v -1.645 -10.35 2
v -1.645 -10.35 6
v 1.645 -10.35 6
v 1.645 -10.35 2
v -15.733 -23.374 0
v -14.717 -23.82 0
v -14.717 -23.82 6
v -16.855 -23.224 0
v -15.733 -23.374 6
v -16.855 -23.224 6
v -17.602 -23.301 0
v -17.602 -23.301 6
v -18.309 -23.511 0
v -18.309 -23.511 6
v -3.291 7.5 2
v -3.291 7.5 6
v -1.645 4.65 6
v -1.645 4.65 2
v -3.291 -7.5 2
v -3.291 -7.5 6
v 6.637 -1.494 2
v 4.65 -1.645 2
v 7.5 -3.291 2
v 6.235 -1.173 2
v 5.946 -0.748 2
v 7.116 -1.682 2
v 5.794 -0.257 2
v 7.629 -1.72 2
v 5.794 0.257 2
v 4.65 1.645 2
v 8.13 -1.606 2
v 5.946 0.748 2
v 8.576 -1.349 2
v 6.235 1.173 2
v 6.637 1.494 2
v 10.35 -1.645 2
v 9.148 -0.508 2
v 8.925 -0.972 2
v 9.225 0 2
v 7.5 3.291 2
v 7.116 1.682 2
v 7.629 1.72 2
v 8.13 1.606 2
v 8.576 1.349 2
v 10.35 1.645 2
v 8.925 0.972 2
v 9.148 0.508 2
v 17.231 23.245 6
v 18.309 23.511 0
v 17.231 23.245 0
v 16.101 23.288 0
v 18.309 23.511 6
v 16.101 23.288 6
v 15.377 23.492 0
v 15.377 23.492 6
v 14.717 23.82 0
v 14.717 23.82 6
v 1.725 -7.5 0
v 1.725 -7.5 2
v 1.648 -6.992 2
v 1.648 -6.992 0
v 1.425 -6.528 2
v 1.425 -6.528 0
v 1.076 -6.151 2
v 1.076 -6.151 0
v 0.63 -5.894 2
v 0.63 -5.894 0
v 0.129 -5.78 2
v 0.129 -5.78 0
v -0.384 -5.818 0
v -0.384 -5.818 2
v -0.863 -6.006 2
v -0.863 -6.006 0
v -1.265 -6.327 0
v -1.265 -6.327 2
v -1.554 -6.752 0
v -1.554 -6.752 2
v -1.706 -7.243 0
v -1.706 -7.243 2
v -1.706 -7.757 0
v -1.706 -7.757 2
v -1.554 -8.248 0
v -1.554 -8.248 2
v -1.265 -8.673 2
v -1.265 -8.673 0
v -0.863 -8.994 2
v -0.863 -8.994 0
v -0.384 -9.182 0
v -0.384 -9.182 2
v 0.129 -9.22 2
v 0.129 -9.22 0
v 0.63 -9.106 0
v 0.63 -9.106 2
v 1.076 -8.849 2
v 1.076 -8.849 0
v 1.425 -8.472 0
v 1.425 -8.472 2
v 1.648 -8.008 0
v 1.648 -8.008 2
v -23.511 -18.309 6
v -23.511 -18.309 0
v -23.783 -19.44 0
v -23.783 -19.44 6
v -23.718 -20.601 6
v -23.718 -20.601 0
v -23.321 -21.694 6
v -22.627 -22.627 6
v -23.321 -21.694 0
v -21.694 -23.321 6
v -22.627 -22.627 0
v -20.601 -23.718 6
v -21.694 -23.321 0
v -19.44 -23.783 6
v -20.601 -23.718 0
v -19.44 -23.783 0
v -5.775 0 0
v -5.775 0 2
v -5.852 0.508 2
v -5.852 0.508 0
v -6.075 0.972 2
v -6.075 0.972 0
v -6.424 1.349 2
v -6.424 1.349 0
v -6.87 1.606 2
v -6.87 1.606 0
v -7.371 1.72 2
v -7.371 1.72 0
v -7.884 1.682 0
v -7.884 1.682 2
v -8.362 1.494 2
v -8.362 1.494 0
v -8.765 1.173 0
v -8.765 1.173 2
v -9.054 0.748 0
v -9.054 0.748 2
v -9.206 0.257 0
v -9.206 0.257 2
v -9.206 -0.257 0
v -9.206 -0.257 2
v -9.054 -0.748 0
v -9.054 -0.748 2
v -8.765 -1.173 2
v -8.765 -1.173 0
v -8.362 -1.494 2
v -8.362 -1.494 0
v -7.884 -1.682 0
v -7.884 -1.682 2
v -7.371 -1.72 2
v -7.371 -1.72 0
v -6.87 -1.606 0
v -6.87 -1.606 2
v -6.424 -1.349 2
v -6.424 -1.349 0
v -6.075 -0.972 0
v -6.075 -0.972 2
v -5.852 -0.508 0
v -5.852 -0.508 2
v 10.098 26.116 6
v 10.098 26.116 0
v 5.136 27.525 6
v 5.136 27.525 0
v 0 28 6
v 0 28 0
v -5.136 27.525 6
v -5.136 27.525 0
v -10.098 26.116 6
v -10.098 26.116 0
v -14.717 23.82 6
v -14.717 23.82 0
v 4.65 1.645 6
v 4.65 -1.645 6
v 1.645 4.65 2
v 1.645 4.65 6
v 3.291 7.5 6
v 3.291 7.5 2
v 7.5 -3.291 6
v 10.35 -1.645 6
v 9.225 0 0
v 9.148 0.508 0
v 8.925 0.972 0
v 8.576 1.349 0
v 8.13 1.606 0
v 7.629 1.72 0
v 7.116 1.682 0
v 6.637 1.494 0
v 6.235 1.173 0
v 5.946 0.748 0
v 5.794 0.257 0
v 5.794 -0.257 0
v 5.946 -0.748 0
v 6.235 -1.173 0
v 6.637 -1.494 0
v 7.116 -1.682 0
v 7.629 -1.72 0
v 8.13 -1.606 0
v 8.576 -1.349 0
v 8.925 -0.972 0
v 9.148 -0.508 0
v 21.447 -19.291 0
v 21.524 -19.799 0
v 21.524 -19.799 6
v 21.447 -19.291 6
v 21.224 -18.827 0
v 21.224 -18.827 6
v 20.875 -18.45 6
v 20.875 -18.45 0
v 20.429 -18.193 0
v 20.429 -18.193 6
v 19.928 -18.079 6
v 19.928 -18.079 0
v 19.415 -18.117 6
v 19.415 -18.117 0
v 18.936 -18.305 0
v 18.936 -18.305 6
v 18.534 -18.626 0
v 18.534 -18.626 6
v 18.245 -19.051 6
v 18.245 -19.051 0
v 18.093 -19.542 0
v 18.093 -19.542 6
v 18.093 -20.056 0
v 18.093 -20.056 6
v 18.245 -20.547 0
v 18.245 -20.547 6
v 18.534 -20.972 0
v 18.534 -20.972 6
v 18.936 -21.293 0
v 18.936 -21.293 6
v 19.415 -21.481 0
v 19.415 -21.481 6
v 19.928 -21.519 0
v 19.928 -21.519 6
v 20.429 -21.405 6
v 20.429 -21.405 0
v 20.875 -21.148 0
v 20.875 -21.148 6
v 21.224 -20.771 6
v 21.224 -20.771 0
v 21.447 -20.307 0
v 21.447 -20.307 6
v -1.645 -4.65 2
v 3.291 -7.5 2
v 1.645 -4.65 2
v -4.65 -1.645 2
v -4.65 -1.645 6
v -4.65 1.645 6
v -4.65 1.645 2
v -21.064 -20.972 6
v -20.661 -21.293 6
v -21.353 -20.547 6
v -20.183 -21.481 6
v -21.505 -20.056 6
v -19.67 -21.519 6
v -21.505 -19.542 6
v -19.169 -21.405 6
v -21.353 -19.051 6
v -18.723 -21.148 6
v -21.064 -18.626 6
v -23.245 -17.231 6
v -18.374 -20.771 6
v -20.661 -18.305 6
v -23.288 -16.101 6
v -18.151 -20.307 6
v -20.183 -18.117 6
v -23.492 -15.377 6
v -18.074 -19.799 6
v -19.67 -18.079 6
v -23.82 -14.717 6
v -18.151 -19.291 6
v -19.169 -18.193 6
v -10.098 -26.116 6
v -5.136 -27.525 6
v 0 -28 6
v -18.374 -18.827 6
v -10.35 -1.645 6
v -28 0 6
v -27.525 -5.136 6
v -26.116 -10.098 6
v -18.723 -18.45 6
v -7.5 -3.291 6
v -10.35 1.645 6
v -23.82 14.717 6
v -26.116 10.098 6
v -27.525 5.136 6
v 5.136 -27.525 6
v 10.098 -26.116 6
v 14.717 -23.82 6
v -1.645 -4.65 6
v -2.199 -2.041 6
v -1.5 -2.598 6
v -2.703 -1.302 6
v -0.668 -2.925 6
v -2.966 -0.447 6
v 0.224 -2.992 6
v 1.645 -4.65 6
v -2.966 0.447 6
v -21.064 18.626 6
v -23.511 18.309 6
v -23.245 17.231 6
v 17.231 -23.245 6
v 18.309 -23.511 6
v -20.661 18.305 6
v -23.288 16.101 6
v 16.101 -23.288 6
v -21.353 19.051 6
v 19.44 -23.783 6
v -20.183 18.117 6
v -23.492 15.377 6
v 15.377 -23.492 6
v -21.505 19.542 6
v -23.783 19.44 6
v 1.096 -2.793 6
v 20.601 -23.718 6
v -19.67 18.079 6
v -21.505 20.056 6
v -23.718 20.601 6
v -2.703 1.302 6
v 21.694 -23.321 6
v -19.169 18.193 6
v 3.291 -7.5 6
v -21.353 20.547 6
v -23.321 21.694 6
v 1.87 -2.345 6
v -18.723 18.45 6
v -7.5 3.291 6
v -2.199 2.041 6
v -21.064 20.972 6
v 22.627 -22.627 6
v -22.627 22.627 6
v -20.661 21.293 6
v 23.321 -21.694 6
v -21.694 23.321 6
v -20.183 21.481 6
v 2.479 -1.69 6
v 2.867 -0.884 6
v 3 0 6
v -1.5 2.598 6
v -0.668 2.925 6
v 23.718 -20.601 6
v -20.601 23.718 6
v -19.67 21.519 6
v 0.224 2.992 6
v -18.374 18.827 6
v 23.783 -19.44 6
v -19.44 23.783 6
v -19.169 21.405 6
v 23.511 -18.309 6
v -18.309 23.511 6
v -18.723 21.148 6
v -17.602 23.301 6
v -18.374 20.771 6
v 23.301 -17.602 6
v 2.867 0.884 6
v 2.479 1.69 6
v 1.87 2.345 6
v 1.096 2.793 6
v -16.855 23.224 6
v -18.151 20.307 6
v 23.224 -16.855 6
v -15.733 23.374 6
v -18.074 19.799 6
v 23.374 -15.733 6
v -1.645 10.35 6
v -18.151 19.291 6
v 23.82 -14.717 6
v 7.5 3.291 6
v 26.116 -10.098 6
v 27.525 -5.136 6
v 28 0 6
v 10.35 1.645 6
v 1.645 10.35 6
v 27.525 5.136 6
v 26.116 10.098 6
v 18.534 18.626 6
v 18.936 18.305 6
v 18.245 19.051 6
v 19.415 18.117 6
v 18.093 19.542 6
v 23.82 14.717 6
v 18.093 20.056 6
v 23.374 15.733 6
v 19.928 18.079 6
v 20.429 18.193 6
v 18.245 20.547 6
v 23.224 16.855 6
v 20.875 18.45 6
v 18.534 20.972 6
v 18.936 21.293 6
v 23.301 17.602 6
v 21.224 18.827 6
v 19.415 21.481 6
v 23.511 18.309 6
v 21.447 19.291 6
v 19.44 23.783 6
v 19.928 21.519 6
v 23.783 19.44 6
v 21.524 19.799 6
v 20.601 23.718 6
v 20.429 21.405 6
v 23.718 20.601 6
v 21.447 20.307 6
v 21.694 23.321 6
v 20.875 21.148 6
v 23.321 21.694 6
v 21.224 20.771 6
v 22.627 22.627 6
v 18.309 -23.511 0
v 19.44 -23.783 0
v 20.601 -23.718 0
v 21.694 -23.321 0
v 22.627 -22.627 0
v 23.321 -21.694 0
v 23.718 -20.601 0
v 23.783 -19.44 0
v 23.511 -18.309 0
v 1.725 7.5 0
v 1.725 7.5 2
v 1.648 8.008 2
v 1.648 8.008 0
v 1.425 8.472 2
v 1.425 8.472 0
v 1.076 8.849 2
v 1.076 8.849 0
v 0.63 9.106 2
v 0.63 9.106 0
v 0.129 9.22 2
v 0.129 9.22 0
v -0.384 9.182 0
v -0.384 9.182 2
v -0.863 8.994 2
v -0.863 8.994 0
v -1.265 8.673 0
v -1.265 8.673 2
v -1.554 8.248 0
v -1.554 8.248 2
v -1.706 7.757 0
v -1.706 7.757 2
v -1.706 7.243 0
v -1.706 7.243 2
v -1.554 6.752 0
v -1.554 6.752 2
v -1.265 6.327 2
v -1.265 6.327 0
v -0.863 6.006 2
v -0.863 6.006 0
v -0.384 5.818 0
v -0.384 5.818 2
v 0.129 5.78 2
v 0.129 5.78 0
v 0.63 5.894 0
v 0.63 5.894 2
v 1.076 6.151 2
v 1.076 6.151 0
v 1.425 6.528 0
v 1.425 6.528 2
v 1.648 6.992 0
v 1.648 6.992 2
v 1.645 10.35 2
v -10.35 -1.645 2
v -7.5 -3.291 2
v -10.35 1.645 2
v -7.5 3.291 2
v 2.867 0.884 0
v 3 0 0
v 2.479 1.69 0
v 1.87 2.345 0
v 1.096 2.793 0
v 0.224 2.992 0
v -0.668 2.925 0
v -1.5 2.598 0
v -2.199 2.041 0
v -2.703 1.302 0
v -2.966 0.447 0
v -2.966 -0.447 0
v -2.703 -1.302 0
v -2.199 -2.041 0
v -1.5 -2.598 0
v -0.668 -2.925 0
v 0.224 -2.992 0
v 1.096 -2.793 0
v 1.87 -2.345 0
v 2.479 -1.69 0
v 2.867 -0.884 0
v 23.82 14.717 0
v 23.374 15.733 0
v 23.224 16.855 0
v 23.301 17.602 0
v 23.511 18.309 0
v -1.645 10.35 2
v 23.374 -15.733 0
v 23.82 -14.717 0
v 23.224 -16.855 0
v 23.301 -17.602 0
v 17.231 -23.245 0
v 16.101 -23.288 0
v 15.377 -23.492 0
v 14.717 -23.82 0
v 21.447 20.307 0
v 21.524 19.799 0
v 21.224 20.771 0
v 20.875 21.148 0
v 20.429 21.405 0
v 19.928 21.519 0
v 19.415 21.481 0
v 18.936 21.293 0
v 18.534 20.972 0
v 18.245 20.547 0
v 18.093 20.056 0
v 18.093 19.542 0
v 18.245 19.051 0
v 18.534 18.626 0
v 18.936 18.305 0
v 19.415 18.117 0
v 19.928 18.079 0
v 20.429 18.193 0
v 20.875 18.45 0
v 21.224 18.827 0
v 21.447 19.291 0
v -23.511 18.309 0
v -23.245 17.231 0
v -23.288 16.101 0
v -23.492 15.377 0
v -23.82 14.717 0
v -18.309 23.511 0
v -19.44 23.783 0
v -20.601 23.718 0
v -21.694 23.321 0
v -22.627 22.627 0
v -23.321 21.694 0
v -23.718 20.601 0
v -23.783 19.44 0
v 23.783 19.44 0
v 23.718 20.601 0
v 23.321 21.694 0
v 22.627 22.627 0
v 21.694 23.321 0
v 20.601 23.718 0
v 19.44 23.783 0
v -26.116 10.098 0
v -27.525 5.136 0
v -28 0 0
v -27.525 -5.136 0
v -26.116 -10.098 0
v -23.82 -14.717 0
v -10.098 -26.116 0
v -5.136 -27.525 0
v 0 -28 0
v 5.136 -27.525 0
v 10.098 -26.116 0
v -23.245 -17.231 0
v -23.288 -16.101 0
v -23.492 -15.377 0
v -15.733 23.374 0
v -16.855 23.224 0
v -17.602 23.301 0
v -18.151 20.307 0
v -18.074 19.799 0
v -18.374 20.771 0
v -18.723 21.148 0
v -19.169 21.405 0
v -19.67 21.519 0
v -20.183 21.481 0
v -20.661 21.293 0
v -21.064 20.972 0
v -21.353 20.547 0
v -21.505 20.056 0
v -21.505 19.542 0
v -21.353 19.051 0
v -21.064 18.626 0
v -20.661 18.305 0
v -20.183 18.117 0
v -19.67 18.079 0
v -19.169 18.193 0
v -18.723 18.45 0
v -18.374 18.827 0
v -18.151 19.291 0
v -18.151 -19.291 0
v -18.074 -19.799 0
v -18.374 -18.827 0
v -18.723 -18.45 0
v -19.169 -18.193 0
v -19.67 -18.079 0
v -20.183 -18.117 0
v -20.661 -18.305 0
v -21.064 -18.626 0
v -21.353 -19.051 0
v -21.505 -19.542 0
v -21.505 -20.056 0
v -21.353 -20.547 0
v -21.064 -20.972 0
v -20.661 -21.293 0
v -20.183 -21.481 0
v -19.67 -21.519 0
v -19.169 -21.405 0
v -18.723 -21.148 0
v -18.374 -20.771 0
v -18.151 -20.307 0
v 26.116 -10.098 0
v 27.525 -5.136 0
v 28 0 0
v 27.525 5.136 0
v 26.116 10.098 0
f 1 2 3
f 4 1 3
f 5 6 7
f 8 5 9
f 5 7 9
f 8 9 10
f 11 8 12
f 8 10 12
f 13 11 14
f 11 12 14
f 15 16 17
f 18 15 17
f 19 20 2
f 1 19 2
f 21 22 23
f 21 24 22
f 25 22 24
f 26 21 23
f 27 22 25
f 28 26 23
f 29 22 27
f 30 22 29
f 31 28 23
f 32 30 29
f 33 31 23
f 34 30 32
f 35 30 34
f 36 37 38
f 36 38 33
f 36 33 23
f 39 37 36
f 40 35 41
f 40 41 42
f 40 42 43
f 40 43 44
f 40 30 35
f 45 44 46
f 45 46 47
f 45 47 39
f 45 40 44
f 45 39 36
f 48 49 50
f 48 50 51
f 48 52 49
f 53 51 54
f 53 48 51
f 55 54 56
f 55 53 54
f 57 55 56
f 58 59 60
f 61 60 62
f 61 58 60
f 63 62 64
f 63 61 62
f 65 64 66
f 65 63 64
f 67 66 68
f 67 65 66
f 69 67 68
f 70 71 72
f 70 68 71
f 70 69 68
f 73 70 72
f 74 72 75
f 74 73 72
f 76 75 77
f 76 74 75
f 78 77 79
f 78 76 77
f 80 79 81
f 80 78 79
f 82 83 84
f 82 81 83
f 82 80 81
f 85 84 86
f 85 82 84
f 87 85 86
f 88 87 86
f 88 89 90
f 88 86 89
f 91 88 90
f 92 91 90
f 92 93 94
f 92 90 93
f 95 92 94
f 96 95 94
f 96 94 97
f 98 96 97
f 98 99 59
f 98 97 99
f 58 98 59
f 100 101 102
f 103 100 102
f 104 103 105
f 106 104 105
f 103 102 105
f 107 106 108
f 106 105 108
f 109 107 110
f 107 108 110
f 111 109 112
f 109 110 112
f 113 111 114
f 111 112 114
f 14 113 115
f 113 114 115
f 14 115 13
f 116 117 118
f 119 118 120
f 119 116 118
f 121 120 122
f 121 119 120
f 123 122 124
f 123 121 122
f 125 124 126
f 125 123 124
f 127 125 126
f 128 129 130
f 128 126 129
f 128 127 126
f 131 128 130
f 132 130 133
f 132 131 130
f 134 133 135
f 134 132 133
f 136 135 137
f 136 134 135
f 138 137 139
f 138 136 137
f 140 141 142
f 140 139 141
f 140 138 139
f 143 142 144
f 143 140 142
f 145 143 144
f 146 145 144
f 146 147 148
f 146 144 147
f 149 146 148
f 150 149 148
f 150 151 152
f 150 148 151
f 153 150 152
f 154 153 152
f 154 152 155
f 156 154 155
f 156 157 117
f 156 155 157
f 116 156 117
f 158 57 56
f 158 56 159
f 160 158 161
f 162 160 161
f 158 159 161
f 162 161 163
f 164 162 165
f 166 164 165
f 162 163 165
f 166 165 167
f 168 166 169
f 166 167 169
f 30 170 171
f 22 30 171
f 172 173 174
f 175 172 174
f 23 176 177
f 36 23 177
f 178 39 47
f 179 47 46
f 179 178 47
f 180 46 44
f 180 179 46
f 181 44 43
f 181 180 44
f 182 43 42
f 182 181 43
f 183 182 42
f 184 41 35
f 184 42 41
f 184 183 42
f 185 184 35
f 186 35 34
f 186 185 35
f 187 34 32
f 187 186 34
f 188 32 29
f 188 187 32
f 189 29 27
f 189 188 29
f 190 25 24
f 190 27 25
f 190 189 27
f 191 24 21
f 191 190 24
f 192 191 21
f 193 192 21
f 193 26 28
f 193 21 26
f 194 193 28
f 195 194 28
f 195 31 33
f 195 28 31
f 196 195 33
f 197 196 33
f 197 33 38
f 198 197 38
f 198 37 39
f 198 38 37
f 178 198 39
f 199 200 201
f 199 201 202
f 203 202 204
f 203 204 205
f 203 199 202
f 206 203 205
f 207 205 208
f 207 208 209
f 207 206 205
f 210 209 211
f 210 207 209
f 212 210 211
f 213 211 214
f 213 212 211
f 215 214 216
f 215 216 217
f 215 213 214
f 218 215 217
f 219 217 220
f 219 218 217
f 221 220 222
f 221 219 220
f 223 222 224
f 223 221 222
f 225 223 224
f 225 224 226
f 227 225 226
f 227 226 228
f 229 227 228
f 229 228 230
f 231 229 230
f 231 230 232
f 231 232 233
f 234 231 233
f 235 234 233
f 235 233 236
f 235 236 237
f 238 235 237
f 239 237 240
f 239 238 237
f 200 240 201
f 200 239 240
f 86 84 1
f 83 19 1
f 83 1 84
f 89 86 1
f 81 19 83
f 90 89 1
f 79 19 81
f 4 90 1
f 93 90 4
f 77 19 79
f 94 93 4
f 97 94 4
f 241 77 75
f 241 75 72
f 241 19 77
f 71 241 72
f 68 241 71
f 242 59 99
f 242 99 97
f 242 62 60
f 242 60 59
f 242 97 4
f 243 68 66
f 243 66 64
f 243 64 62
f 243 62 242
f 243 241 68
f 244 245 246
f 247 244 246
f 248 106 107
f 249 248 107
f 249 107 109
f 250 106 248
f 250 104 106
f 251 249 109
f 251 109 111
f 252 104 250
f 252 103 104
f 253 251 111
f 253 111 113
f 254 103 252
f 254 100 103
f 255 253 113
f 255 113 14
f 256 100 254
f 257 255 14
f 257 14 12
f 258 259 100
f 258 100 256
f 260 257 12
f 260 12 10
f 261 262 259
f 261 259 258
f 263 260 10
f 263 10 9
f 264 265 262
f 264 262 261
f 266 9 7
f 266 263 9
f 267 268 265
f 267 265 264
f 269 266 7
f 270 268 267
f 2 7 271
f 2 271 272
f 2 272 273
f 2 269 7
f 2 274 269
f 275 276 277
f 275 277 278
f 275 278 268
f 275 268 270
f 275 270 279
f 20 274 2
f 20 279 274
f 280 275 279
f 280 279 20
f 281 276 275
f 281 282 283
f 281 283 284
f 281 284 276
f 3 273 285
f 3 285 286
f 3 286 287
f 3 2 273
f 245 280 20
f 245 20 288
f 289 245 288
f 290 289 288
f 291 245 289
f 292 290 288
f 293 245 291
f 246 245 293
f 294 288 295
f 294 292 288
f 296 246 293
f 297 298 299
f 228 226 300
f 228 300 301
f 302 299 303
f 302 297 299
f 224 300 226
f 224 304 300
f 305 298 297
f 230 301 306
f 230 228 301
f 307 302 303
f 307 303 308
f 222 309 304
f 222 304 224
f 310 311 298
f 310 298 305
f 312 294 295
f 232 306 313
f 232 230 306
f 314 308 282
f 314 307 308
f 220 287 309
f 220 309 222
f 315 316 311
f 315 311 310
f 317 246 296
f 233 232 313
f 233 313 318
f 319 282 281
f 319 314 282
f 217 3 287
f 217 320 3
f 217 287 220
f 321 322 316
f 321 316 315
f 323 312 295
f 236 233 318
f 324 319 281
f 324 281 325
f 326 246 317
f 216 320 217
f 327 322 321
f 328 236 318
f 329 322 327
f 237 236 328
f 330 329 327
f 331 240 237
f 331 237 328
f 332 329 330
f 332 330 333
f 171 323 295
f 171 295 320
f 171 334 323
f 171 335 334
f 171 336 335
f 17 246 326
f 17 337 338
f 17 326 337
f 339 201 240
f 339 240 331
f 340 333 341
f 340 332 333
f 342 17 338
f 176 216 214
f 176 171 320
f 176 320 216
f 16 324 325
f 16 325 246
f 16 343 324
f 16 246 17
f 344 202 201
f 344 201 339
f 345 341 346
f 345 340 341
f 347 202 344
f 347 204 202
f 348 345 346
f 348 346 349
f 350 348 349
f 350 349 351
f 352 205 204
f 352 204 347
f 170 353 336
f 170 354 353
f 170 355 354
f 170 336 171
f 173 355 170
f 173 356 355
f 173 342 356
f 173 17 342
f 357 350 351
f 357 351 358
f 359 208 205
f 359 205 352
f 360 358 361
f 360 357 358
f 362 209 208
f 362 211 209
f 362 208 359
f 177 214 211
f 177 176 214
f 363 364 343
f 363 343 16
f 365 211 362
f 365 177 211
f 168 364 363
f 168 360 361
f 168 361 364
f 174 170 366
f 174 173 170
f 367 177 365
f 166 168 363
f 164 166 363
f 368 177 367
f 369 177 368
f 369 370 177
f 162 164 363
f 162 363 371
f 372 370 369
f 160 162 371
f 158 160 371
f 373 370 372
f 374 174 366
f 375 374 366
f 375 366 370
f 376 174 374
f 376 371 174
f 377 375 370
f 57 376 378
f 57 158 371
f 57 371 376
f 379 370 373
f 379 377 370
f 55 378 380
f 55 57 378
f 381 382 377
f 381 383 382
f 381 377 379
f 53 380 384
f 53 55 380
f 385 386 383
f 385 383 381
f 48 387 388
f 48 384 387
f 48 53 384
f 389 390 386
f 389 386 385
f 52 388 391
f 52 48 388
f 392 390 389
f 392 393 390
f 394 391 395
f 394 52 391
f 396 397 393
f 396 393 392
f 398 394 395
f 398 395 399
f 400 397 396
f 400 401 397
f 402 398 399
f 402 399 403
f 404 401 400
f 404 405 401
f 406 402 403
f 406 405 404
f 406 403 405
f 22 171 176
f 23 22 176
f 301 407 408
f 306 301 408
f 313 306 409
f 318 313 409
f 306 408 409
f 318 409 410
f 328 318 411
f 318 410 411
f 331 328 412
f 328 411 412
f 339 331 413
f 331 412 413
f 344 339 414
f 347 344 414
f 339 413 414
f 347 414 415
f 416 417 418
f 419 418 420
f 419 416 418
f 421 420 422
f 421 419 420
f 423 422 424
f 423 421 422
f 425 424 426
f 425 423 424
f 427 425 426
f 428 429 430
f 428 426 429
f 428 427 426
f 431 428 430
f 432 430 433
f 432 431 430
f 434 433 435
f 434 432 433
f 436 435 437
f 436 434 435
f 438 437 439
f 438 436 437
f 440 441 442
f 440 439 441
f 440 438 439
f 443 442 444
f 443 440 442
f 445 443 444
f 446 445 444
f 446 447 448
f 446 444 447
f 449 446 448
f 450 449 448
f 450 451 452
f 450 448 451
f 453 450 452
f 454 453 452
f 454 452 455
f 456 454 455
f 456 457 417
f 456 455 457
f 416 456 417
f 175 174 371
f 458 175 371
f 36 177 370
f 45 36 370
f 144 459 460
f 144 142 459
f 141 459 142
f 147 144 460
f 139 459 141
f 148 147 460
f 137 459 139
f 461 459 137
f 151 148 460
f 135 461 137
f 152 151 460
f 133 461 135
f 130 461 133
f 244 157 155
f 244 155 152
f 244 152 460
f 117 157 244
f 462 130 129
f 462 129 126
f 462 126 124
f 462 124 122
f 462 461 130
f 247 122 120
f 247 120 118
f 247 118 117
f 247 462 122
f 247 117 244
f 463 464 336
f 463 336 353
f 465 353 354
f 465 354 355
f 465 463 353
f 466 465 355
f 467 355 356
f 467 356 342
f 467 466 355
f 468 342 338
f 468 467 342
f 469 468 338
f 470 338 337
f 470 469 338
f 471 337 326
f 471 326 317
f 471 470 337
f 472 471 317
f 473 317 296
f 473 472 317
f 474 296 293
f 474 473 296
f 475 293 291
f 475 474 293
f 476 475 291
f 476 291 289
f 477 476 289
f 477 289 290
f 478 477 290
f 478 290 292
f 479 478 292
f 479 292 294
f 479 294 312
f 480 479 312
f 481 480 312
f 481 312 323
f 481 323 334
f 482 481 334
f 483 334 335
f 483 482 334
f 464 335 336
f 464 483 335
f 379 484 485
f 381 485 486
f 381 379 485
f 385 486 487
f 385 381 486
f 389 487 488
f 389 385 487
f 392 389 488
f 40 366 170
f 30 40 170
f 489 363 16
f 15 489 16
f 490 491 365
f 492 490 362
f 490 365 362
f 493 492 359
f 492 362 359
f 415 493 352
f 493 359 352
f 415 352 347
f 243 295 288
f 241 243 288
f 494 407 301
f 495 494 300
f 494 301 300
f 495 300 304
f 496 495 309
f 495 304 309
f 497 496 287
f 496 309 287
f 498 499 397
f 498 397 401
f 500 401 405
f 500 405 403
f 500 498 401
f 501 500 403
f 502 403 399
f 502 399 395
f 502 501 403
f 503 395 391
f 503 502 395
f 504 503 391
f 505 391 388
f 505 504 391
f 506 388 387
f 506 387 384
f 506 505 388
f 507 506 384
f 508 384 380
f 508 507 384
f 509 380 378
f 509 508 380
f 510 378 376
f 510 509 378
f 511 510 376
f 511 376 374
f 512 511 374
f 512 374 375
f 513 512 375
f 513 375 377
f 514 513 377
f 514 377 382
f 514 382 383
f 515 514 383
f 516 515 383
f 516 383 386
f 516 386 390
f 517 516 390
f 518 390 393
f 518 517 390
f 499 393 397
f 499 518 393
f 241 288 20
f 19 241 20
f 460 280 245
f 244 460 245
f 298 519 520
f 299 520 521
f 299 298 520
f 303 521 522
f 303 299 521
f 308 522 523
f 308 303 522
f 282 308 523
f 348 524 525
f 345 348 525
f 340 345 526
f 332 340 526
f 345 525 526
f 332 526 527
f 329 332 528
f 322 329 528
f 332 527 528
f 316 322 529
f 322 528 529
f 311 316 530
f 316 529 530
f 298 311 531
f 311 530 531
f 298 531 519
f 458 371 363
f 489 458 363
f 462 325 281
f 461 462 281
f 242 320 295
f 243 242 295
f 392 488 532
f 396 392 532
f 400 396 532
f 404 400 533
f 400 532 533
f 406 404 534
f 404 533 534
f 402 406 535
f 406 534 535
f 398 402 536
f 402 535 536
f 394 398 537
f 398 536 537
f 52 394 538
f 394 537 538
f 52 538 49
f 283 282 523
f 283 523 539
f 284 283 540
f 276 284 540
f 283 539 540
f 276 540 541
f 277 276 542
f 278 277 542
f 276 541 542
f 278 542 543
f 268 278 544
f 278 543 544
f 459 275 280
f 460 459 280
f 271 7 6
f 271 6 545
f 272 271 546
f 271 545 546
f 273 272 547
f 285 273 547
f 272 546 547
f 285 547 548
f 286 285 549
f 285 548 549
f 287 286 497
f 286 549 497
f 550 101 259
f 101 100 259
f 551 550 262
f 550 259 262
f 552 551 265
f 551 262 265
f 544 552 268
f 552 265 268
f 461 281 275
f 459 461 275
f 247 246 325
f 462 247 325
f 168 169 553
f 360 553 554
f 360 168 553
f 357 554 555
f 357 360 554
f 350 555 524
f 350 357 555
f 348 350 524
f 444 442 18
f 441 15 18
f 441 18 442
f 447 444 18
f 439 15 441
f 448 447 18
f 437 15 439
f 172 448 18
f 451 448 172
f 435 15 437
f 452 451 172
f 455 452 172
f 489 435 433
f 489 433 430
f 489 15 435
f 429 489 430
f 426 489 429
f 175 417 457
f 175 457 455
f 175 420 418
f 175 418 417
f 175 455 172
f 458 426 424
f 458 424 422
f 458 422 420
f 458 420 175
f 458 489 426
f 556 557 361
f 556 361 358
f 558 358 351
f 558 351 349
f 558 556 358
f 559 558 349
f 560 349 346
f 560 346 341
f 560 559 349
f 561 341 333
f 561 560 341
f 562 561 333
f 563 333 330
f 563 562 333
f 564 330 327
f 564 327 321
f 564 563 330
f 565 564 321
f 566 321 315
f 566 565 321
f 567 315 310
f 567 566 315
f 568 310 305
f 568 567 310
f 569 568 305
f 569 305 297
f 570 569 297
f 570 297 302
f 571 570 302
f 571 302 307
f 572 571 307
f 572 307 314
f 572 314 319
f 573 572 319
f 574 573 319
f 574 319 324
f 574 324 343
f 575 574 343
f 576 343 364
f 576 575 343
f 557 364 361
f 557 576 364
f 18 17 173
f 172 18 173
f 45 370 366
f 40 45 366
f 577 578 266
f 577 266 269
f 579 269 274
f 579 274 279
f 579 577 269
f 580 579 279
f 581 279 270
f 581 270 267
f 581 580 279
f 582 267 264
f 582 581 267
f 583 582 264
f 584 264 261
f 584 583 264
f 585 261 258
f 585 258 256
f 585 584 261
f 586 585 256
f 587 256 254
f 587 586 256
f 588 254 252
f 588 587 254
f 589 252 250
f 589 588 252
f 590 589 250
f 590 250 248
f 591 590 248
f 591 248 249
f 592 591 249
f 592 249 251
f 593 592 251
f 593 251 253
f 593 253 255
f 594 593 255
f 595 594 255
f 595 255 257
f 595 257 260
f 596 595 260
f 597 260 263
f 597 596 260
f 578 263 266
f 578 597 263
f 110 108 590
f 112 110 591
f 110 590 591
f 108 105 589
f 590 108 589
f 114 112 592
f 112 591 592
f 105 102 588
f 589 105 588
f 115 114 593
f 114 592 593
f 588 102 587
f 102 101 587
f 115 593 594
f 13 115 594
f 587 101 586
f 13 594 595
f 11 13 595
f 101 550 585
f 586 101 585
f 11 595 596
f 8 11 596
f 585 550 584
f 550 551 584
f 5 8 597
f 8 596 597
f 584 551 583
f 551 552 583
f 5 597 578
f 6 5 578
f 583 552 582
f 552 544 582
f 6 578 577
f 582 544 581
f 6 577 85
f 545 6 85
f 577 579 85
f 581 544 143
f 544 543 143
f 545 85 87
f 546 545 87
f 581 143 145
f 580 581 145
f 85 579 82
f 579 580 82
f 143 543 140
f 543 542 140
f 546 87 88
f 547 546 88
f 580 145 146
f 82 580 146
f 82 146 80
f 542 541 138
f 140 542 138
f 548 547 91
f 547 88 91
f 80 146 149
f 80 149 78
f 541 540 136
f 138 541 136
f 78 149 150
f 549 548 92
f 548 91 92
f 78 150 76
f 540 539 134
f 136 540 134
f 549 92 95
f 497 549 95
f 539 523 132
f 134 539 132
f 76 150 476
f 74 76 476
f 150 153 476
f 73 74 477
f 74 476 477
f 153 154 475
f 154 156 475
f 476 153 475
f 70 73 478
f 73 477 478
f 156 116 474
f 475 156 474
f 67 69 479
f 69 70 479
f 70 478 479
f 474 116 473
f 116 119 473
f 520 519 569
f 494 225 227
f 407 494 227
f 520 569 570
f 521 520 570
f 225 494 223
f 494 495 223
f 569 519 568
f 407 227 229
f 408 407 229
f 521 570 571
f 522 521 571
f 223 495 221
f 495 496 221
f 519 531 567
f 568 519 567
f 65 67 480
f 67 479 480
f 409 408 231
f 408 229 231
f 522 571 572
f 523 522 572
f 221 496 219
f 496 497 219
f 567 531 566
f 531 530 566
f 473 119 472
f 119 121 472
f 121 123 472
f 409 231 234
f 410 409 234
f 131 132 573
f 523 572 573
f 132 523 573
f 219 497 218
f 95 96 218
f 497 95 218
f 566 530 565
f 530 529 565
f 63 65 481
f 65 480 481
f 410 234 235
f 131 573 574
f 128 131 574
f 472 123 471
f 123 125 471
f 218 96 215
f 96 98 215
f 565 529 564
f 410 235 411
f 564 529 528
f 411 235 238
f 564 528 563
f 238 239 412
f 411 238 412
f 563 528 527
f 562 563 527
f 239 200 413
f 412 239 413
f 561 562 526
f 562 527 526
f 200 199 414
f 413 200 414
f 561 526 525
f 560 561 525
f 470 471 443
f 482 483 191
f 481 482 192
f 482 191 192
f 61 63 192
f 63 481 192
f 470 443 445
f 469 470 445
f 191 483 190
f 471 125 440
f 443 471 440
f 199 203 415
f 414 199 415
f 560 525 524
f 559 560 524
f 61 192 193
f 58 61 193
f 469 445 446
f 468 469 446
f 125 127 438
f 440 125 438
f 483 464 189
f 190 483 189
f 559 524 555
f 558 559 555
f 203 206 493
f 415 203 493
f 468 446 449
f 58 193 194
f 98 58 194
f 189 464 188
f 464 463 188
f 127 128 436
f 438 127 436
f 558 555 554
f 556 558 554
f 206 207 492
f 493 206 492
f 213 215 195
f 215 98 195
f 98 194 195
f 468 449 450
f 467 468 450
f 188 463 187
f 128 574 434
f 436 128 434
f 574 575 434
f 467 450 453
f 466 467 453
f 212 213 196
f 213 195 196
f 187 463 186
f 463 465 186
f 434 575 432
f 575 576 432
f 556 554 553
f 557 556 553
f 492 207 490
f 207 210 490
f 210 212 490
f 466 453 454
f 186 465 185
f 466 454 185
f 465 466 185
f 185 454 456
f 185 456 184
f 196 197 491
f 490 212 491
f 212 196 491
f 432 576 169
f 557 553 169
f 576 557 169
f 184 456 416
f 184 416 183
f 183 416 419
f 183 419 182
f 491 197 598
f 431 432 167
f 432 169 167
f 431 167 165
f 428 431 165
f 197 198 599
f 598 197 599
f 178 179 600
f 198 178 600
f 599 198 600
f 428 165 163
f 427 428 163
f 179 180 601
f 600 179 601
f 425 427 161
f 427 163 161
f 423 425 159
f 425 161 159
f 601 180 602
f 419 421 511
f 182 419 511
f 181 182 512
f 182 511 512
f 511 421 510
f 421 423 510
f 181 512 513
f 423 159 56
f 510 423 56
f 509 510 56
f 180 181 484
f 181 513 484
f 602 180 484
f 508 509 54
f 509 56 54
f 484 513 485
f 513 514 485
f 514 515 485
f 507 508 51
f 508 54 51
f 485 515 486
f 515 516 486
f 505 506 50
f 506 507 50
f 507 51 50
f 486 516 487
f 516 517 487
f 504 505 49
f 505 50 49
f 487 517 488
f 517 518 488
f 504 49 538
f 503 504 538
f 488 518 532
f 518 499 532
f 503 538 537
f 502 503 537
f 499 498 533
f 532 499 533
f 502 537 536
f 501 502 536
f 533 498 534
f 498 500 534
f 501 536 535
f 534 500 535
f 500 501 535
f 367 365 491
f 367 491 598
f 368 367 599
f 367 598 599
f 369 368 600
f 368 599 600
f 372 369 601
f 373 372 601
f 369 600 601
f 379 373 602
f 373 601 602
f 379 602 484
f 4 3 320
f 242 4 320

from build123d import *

# Parameters (mm, degrees)
SKETCH1_R           = 1.725
SKETCH1_R_2         = 3
BOSS_EXTRUDE3_DEPTH = 6
CUT_EXTRUDE1_DEPTH  = 4
FILLET1_R           = 4


with BuildPart() as part:
    # Sketch1 → Boss-Extrude3 (new body)
    with BuildSketch(Plane.XY):
        with BuildLine():
            ThreePointArc((22.418161887, -16.775756842), (28, 0), (22.418161887, 16.775756842))
            ThreePointArc((22.418161887, 16.775756842), (22.627416998, 22.627416998), (16.775756842, 22.418161887))
            ThreePointArc((16.775756842, 22.418161887), (0, 28), (-16.775756842, 22.418161887))
            ThreePointArc((-16.775756842, 22.418161887), (-22.627416998, 22.627416998), (-22.418161887, 16.775756842))
            ThreePointArc((-22.418161887, 16.775756842), (-28, 0), (-22.418161887, -16.775756842))
            ThreePointArc((-22.418161887, -16.775756842), (-22.627416998, -22.627416998), (-16.775756842, -22.418161887))
            ThreePointArc((-16.775756842, -22.418161887), (0, -28), (16.775756842, -22.418161887))
            ThreePointArc((16.775756842, -22.418161887), (22.627416998, -22.627416998), (22.418161887, -16.775756842))
        make_face()
        with Locations((-19.798989873, 19.798989873)):
            Circle(SKETCH1_R, mode=Mode.SUBTRACT)
        with Locations((19.798989873, 19.798989873)):
            Circle(SKETCH1_R, mode=Mode.SUBTRACT)
        with Locations((-19.798989873, -19.798989873)):
            Circle(SKETCH1_R, mode=Mode.SUBTRACT)
        with Locations((19.798989873, -19.798989873)):
            Circle(SKETCH1_R, mode=Mode.SUBTRACT)
        Circle(SKETCH1_R_2, mode=Mode.SUBTRACT)
        with Locations((0, 7.5)):
            Circle(SKETCH1_R, mode=Mode.SUBTRACT)
        with Locations((-7.5, 0)):
            Circle(SKETCH1_R, mode=Mode.SUBTRACT)
        with Locations((0, -7.5)):
            Circle(SKETCH1_R, mode=Mode.SUBTRACT)
        with Locations((7.5, 0)):
            Circle(SKETCH1_R, mode=Mode.SUBTRACT)
    extrude(amount=BOSS_EXTRUDE3_DEPTH)

    # Sketch2 → Cut-Extrude1 (cut)
    with BuildSketch(Plane.XY.offset(6)):
        Polygon((3.290896534, 7.5), (1.645448267, 10.35), (-1.645448267, 10.35), (-3.290896534, 7.5), (-1.645448267, 4.65), (1.645448267, 4.65), align=None)
        Polygon((-4.65, 1.645448267), (-7.5, 3.290896534), (-10.35, 1.645448267), (-10.35, -1.645448267), (-7.5, -3.290896534), (-4.65, -1.645448267), align=None)
        Polygon((10.35, -1.645448267), (10.35, 1.645448267), (7.5, 3.290896534), (4.65, 1.645448267), (4.65, -1.645448267), (7.5, -3.290896534), align=None)
        Polygon((3.290896534, -7.5), (1.645448267, -4.65), (-1.645448267, -4.65), (-3.290896534, -7.5), (-1.645448267, -10.35), (1.645448267, -10.35), align=None)
    extrude(amount=-CUT_EXTRUDE1_DEPTH, mode=Mode.SUBTRACT)

    # Fillet1
    fillet1_edges = [part.edges().sort_by_distance(p)[0] for p in [
        (22.418161887, 16.775756842, 3),
        (22.418161887, -16.775756842, 3),
        (16.775756842, -22.418161887, 3),
        (-16.775756842, -22.418161887, 3),
        (-22.418161887, -16.775756842, 3),
        (-22.418161887, 16.775756842, 3),
        (-16.775756842, 22.418161887, 3),
        (16.775756842, 22.418161887, 3),
    ]]
    fillet(fillet1_edges, radius=FILLET1_R)


solid = part.part
